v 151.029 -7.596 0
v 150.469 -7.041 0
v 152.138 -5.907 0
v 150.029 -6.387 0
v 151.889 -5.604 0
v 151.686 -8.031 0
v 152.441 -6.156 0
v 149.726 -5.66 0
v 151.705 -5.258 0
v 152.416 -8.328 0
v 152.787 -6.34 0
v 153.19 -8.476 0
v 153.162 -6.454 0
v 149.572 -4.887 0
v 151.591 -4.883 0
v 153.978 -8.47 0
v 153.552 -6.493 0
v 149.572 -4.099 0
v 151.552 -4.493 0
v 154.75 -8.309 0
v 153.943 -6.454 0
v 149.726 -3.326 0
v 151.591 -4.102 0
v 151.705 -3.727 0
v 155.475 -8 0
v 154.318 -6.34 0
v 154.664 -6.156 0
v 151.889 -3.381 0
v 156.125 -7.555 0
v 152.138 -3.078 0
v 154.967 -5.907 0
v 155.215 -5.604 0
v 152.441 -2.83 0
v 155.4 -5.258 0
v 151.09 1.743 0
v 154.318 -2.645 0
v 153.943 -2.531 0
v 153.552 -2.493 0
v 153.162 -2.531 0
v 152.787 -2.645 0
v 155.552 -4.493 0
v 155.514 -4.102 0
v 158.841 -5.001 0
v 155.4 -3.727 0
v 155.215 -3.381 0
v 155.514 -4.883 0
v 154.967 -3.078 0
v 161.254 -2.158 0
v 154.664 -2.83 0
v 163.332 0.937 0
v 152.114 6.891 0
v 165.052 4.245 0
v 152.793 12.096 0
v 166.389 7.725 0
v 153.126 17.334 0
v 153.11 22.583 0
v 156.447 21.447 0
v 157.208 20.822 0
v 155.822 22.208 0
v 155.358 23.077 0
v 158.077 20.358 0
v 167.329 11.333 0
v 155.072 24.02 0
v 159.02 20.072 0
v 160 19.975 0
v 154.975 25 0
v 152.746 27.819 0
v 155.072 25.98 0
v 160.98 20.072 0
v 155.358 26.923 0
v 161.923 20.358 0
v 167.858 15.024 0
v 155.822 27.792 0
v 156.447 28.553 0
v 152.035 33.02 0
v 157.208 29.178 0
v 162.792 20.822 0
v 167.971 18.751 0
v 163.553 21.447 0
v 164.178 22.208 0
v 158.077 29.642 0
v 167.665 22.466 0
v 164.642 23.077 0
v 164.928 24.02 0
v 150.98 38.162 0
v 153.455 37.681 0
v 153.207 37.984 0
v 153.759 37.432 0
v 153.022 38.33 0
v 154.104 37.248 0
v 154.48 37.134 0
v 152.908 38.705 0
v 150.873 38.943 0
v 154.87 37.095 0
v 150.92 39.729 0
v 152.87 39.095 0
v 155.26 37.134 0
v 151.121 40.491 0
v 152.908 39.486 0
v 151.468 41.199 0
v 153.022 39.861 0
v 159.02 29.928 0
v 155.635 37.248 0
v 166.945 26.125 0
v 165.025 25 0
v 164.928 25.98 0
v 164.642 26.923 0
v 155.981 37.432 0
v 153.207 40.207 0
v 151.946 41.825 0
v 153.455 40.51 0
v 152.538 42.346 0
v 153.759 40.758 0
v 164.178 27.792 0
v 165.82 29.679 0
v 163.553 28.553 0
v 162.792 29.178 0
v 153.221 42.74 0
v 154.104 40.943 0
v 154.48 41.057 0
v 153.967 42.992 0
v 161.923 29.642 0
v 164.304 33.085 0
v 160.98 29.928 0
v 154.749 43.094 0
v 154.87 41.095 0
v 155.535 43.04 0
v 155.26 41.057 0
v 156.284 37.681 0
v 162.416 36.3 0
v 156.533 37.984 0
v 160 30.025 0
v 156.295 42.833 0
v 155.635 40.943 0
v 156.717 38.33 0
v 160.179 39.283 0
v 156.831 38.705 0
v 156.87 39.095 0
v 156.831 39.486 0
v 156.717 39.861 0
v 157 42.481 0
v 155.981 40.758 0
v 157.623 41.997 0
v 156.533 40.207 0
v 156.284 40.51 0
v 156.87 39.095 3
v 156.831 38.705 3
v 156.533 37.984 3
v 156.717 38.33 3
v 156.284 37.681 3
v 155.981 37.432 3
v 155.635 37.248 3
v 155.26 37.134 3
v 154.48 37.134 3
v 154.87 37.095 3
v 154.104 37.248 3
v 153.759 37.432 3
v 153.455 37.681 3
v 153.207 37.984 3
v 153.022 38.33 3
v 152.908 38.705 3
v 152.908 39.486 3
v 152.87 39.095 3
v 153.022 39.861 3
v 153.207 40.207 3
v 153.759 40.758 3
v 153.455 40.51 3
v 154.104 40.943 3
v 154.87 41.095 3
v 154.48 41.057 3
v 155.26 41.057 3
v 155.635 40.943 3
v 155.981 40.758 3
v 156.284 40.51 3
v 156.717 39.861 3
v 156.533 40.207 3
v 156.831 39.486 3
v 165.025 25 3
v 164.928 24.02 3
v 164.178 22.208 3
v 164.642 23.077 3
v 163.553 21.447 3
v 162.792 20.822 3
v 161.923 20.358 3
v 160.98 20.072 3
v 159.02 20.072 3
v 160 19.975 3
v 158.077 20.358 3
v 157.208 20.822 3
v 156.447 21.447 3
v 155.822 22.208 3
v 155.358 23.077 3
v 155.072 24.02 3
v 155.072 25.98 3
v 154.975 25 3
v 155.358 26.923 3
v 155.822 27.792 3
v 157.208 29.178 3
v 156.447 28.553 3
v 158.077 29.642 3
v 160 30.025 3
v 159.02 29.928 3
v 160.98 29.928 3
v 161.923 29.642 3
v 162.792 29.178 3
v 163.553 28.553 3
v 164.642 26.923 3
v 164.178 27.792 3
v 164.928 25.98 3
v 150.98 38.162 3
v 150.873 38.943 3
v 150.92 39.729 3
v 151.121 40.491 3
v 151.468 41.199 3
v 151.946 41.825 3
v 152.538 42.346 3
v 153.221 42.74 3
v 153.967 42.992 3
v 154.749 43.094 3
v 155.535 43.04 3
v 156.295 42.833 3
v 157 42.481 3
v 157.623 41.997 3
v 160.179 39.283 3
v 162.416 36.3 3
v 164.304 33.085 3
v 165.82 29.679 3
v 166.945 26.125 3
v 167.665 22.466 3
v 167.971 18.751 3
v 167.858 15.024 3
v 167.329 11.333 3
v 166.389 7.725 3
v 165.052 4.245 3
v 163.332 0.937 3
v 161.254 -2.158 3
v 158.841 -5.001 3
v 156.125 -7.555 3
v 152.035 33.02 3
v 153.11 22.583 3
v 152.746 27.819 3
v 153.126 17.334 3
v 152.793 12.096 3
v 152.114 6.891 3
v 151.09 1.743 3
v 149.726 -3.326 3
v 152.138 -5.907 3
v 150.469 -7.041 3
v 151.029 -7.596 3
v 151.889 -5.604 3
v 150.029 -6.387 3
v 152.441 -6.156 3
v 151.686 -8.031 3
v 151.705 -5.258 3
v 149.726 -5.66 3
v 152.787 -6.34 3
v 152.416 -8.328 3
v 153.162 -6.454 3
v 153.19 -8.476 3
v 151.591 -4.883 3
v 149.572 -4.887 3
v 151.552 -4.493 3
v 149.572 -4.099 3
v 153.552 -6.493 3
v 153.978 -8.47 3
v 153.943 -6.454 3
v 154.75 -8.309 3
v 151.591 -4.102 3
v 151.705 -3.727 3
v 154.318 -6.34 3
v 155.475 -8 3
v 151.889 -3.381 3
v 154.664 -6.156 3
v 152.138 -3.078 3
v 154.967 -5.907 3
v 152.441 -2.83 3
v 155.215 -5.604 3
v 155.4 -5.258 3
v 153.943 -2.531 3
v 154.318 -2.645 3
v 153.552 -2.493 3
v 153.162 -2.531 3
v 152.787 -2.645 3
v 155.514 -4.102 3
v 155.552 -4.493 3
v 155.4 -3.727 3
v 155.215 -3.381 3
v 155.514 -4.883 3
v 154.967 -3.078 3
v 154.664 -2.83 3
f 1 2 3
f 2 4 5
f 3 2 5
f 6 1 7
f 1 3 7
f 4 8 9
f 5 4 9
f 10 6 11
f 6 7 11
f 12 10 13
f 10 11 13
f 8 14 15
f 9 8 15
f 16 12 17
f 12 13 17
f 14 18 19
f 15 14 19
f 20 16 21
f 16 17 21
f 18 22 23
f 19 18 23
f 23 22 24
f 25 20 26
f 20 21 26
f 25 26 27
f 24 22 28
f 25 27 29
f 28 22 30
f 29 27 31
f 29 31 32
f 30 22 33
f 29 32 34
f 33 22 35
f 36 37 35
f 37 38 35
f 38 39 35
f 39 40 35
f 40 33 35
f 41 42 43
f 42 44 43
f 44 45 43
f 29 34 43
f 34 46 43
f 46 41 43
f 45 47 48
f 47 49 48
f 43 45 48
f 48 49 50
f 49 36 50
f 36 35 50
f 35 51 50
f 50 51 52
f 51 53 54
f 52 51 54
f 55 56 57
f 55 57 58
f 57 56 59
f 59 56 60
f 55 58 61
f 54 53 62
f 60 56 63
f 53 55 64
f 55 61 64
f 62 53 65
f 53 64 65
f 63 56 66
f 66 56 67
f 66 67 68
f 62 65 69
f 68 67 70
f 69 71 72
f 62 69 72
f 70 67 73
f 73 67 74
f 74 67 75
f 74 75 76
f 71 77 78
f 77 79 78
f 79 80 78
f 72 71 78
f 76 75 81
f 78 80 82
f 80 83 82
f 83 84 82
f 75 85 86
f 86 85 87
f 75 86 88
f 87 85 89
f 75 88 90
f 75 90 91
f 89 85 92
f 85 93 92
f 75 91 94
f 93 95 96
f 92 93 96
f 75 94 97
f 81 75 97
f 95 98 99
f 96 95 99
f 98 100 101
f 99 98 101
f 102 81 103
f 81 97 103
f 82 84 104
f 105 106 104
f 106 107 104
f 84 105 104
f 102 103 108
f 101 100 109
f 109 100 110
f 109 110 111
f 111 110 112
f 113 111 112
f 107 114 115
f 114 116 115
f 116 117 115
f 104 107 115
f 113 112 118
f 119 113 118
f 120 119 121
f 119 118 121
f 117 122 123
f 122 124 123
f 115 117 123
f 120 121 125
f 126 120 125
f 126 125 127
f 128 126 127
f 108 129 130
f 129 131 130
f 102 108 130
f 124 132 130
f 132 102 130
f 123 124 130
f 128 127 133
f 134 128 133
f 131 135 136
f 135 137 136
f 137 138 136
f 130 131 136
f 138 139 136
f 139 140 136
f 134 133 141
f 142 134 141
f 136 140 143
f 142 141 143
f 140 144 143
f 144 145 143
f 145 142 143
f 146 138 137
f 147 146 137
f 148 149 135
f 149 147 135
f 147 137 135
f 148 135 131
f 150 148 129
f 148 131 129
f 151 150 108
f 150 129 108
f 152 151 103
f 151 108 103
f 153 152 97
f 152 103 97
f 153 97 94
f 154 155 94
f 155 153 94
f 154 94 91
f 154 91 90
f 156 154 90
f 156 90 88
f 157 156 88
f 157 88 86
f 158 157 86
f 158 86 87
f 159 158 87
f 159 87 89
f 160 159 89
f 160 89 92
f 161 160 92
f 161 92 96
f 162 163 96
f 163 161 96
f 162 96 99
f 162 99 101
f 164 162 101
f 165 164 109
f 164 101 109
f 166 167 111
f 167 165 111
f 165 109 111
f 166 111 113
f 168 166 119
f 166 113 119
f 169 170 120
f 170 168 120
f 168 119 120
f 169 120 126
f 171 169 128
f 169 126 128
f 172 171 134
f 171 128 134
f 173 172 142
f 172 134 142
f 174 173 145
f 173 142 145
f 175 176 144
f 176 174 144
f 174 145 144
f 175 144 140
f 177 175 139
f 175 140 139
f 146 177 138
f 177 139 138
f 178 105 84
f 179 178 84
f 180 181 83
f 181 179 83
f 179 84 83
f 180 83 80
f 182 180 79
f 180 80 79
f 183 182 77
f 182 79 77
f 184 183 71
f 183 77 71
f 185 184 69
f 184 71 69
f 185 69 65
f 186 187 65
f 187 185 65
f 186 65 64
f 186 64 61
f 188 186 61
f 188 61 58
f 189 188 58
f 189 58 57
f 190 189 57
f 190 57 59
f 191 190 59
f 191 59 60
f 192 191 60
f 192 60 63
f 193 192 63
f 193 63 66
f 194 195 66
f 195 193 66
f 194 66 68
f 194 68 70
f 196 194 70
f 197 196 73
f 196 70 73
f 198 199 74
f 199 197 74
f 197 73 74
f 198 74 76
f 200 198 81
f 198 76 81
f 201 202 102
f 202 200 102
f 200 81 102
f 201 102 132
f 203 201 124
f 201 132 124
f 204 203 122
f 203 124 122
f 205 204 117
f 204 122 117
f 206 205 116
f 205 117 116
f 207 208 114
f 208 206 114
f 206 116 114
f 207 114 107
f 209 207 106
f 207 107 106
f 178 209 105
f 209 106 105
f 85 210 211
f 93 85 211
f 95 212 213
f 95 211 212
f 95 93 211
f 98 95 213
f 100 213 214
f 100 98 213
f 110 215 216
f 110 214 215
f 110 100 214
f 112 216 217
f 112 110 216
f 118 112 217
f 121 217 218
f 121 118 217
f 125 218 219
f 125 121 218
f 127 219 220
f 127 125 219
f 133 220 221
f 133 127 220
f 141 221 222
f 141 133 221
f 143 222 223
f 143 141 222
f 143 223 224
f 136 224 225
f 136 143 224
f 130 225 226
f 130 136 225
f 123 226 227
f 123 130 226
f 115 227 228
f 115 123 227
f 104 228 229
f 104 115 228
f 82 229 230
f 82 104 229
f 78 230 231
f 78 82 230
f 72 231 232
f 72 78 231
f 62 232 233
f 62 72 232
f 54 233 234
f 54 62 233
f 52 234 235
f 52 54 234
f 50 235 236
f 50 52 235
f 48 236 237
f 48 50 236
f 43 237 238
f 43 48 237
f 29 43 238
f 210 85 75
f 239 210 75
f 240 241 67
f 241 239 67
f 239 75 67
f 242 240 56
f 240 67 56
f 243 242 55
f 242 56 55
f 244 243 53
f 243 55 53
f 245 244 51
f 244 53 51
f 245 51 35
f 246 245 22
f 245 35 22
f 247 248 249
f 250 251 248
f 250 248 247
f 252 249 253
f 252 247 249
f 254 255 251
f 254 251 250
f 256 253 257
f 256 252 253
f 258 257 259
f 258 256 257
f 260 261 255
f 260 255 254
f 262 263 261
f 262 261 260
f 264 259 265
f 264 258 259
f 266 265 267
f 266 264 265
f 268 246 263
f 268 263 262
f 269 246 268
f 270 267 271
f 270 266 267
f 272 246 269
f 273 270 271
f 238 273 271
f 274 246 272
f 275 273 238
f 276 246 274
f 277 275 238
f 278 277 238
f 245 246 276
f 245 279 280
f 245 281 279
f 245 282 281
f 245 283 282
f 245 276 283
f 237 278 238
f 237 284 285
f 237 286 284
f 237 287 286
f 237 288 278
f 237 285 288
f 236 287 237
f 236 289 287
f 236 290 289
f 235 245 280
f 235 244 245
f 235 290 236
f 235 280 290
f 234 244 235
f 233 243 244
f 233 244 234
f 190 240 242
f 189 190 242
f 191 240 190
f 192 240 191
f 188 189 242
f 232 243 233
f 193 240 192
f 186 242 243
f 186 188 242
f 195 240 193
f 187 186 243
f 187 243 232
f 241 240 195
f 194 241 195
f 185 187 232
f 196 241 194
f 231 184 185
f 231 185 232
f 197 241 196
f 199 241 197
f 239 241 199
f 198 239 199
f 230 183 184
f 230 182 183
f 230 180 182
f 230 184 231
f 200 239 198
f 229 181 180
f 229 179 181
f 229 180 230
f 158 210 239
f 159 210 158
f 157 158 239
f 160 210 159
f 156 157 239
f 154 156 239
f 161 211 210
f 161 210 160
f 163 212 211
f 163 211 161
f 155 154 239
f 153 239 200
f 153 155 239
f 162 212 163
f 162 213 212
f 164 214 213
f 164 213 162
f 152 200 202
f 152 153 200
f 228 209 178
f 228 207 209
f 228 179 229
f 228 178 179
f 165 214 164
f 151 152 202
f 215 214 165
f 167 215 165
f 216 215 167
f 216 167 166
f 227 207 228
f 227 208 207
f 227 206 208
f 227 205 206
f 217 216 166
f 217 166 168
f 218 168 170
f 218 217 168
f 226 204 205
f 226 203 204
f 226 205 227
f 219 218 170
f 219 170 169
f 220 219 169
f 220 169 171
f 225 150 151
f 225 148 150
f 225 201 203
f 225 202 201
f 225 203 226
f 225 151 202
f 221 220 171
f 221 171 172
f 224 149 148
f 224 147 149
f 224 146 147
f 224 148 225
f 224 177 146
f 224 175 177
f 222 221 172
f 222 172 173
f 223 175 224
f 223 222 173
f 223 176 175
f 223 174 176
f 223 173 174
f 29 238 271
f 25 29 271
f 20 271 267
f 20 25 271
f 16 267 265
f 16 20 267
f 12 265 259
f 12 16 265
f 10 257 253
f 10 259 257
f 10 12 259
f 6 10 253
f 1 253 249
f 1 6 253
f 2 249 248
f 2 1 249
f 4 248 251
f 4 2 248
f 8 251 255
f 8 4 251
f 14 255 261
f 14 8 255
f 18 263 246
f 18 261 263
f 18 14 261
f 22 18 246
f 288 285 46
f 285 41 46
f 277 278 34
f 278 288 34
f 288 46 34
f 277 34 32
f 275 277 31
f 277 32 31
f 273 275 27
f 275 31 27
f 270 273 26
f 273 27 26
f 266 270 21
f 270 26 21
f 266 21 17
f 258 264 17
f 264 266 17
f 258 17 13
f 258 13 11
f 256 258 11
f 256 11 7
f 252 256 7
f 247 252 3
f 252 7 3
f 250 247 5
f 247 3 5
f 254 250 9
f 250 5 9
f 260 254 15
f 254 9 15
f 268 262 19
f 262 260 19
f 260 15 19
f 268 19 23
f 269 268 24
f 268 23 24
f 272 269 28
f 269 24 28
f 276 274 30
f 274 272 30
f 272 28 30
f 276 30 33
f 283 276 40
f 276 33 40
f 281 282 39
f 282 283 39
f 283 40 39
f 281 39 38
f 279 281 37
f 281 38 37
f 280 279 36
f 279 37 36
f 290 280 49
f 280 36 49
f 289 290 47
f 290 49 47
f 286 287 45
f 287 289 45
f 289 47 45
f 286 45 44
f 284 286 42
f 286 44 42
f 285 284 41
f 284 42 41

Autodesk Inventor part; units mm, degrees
ref_plane "YZ Plane" through (0, 0, 0) normal (1, 0, 0) x (0, 1, 0)
ref_plane "XZ Plane" through (0, 0, 0) normal (0, 1, 0) x (-1, 0, 0)
ref_plane "XY Plane" through (0, 0, 0) normal (0, 0, 1) x (1, 0, 0)
sketch "スケッチ1" plane through (0, 0, 0) normal (0, 0, 1) x (1, 0, 0)
  circle A0 centre (154.8697, 39.0954) radius 2
  circle A1 centre (153.5524, -4.4926) radius 2
  circle A2 centre (160, 25) radius 2
  circle A3 centre (154.8697, 39.0954) radius 4
  circle A4 centre (153.5524, -4.4926) radius 4
  circle A5 centre (160, 25) radius 7
  circle A6 centre (160, 25) radius 5.025
  arc A7 (149.7263, -3.3259) -> (150.9802, 38.1619) centre (74.1465, 19.7211) ccw
  arc A8 (156.1251, -7.5554) -> (157.6227, 41.9973) centre (134.7514, 17.8895) ccw
  point P0 (0, 0)
  point P1 (0, 0)
  dimension "d0" = 8
  dimension "d1" = 8
  dimension "d2" = 14
  dimension "d3" = 10.05
extrude "押し出し1" add sketch "スケッチ1" along normal blind 3 contours A3 | A3 A8 A5 A7 | A8 A4 A7 A5 | A5 | A4
properties part number "原動節固定部" material "アルミニウム 2014-T4"
